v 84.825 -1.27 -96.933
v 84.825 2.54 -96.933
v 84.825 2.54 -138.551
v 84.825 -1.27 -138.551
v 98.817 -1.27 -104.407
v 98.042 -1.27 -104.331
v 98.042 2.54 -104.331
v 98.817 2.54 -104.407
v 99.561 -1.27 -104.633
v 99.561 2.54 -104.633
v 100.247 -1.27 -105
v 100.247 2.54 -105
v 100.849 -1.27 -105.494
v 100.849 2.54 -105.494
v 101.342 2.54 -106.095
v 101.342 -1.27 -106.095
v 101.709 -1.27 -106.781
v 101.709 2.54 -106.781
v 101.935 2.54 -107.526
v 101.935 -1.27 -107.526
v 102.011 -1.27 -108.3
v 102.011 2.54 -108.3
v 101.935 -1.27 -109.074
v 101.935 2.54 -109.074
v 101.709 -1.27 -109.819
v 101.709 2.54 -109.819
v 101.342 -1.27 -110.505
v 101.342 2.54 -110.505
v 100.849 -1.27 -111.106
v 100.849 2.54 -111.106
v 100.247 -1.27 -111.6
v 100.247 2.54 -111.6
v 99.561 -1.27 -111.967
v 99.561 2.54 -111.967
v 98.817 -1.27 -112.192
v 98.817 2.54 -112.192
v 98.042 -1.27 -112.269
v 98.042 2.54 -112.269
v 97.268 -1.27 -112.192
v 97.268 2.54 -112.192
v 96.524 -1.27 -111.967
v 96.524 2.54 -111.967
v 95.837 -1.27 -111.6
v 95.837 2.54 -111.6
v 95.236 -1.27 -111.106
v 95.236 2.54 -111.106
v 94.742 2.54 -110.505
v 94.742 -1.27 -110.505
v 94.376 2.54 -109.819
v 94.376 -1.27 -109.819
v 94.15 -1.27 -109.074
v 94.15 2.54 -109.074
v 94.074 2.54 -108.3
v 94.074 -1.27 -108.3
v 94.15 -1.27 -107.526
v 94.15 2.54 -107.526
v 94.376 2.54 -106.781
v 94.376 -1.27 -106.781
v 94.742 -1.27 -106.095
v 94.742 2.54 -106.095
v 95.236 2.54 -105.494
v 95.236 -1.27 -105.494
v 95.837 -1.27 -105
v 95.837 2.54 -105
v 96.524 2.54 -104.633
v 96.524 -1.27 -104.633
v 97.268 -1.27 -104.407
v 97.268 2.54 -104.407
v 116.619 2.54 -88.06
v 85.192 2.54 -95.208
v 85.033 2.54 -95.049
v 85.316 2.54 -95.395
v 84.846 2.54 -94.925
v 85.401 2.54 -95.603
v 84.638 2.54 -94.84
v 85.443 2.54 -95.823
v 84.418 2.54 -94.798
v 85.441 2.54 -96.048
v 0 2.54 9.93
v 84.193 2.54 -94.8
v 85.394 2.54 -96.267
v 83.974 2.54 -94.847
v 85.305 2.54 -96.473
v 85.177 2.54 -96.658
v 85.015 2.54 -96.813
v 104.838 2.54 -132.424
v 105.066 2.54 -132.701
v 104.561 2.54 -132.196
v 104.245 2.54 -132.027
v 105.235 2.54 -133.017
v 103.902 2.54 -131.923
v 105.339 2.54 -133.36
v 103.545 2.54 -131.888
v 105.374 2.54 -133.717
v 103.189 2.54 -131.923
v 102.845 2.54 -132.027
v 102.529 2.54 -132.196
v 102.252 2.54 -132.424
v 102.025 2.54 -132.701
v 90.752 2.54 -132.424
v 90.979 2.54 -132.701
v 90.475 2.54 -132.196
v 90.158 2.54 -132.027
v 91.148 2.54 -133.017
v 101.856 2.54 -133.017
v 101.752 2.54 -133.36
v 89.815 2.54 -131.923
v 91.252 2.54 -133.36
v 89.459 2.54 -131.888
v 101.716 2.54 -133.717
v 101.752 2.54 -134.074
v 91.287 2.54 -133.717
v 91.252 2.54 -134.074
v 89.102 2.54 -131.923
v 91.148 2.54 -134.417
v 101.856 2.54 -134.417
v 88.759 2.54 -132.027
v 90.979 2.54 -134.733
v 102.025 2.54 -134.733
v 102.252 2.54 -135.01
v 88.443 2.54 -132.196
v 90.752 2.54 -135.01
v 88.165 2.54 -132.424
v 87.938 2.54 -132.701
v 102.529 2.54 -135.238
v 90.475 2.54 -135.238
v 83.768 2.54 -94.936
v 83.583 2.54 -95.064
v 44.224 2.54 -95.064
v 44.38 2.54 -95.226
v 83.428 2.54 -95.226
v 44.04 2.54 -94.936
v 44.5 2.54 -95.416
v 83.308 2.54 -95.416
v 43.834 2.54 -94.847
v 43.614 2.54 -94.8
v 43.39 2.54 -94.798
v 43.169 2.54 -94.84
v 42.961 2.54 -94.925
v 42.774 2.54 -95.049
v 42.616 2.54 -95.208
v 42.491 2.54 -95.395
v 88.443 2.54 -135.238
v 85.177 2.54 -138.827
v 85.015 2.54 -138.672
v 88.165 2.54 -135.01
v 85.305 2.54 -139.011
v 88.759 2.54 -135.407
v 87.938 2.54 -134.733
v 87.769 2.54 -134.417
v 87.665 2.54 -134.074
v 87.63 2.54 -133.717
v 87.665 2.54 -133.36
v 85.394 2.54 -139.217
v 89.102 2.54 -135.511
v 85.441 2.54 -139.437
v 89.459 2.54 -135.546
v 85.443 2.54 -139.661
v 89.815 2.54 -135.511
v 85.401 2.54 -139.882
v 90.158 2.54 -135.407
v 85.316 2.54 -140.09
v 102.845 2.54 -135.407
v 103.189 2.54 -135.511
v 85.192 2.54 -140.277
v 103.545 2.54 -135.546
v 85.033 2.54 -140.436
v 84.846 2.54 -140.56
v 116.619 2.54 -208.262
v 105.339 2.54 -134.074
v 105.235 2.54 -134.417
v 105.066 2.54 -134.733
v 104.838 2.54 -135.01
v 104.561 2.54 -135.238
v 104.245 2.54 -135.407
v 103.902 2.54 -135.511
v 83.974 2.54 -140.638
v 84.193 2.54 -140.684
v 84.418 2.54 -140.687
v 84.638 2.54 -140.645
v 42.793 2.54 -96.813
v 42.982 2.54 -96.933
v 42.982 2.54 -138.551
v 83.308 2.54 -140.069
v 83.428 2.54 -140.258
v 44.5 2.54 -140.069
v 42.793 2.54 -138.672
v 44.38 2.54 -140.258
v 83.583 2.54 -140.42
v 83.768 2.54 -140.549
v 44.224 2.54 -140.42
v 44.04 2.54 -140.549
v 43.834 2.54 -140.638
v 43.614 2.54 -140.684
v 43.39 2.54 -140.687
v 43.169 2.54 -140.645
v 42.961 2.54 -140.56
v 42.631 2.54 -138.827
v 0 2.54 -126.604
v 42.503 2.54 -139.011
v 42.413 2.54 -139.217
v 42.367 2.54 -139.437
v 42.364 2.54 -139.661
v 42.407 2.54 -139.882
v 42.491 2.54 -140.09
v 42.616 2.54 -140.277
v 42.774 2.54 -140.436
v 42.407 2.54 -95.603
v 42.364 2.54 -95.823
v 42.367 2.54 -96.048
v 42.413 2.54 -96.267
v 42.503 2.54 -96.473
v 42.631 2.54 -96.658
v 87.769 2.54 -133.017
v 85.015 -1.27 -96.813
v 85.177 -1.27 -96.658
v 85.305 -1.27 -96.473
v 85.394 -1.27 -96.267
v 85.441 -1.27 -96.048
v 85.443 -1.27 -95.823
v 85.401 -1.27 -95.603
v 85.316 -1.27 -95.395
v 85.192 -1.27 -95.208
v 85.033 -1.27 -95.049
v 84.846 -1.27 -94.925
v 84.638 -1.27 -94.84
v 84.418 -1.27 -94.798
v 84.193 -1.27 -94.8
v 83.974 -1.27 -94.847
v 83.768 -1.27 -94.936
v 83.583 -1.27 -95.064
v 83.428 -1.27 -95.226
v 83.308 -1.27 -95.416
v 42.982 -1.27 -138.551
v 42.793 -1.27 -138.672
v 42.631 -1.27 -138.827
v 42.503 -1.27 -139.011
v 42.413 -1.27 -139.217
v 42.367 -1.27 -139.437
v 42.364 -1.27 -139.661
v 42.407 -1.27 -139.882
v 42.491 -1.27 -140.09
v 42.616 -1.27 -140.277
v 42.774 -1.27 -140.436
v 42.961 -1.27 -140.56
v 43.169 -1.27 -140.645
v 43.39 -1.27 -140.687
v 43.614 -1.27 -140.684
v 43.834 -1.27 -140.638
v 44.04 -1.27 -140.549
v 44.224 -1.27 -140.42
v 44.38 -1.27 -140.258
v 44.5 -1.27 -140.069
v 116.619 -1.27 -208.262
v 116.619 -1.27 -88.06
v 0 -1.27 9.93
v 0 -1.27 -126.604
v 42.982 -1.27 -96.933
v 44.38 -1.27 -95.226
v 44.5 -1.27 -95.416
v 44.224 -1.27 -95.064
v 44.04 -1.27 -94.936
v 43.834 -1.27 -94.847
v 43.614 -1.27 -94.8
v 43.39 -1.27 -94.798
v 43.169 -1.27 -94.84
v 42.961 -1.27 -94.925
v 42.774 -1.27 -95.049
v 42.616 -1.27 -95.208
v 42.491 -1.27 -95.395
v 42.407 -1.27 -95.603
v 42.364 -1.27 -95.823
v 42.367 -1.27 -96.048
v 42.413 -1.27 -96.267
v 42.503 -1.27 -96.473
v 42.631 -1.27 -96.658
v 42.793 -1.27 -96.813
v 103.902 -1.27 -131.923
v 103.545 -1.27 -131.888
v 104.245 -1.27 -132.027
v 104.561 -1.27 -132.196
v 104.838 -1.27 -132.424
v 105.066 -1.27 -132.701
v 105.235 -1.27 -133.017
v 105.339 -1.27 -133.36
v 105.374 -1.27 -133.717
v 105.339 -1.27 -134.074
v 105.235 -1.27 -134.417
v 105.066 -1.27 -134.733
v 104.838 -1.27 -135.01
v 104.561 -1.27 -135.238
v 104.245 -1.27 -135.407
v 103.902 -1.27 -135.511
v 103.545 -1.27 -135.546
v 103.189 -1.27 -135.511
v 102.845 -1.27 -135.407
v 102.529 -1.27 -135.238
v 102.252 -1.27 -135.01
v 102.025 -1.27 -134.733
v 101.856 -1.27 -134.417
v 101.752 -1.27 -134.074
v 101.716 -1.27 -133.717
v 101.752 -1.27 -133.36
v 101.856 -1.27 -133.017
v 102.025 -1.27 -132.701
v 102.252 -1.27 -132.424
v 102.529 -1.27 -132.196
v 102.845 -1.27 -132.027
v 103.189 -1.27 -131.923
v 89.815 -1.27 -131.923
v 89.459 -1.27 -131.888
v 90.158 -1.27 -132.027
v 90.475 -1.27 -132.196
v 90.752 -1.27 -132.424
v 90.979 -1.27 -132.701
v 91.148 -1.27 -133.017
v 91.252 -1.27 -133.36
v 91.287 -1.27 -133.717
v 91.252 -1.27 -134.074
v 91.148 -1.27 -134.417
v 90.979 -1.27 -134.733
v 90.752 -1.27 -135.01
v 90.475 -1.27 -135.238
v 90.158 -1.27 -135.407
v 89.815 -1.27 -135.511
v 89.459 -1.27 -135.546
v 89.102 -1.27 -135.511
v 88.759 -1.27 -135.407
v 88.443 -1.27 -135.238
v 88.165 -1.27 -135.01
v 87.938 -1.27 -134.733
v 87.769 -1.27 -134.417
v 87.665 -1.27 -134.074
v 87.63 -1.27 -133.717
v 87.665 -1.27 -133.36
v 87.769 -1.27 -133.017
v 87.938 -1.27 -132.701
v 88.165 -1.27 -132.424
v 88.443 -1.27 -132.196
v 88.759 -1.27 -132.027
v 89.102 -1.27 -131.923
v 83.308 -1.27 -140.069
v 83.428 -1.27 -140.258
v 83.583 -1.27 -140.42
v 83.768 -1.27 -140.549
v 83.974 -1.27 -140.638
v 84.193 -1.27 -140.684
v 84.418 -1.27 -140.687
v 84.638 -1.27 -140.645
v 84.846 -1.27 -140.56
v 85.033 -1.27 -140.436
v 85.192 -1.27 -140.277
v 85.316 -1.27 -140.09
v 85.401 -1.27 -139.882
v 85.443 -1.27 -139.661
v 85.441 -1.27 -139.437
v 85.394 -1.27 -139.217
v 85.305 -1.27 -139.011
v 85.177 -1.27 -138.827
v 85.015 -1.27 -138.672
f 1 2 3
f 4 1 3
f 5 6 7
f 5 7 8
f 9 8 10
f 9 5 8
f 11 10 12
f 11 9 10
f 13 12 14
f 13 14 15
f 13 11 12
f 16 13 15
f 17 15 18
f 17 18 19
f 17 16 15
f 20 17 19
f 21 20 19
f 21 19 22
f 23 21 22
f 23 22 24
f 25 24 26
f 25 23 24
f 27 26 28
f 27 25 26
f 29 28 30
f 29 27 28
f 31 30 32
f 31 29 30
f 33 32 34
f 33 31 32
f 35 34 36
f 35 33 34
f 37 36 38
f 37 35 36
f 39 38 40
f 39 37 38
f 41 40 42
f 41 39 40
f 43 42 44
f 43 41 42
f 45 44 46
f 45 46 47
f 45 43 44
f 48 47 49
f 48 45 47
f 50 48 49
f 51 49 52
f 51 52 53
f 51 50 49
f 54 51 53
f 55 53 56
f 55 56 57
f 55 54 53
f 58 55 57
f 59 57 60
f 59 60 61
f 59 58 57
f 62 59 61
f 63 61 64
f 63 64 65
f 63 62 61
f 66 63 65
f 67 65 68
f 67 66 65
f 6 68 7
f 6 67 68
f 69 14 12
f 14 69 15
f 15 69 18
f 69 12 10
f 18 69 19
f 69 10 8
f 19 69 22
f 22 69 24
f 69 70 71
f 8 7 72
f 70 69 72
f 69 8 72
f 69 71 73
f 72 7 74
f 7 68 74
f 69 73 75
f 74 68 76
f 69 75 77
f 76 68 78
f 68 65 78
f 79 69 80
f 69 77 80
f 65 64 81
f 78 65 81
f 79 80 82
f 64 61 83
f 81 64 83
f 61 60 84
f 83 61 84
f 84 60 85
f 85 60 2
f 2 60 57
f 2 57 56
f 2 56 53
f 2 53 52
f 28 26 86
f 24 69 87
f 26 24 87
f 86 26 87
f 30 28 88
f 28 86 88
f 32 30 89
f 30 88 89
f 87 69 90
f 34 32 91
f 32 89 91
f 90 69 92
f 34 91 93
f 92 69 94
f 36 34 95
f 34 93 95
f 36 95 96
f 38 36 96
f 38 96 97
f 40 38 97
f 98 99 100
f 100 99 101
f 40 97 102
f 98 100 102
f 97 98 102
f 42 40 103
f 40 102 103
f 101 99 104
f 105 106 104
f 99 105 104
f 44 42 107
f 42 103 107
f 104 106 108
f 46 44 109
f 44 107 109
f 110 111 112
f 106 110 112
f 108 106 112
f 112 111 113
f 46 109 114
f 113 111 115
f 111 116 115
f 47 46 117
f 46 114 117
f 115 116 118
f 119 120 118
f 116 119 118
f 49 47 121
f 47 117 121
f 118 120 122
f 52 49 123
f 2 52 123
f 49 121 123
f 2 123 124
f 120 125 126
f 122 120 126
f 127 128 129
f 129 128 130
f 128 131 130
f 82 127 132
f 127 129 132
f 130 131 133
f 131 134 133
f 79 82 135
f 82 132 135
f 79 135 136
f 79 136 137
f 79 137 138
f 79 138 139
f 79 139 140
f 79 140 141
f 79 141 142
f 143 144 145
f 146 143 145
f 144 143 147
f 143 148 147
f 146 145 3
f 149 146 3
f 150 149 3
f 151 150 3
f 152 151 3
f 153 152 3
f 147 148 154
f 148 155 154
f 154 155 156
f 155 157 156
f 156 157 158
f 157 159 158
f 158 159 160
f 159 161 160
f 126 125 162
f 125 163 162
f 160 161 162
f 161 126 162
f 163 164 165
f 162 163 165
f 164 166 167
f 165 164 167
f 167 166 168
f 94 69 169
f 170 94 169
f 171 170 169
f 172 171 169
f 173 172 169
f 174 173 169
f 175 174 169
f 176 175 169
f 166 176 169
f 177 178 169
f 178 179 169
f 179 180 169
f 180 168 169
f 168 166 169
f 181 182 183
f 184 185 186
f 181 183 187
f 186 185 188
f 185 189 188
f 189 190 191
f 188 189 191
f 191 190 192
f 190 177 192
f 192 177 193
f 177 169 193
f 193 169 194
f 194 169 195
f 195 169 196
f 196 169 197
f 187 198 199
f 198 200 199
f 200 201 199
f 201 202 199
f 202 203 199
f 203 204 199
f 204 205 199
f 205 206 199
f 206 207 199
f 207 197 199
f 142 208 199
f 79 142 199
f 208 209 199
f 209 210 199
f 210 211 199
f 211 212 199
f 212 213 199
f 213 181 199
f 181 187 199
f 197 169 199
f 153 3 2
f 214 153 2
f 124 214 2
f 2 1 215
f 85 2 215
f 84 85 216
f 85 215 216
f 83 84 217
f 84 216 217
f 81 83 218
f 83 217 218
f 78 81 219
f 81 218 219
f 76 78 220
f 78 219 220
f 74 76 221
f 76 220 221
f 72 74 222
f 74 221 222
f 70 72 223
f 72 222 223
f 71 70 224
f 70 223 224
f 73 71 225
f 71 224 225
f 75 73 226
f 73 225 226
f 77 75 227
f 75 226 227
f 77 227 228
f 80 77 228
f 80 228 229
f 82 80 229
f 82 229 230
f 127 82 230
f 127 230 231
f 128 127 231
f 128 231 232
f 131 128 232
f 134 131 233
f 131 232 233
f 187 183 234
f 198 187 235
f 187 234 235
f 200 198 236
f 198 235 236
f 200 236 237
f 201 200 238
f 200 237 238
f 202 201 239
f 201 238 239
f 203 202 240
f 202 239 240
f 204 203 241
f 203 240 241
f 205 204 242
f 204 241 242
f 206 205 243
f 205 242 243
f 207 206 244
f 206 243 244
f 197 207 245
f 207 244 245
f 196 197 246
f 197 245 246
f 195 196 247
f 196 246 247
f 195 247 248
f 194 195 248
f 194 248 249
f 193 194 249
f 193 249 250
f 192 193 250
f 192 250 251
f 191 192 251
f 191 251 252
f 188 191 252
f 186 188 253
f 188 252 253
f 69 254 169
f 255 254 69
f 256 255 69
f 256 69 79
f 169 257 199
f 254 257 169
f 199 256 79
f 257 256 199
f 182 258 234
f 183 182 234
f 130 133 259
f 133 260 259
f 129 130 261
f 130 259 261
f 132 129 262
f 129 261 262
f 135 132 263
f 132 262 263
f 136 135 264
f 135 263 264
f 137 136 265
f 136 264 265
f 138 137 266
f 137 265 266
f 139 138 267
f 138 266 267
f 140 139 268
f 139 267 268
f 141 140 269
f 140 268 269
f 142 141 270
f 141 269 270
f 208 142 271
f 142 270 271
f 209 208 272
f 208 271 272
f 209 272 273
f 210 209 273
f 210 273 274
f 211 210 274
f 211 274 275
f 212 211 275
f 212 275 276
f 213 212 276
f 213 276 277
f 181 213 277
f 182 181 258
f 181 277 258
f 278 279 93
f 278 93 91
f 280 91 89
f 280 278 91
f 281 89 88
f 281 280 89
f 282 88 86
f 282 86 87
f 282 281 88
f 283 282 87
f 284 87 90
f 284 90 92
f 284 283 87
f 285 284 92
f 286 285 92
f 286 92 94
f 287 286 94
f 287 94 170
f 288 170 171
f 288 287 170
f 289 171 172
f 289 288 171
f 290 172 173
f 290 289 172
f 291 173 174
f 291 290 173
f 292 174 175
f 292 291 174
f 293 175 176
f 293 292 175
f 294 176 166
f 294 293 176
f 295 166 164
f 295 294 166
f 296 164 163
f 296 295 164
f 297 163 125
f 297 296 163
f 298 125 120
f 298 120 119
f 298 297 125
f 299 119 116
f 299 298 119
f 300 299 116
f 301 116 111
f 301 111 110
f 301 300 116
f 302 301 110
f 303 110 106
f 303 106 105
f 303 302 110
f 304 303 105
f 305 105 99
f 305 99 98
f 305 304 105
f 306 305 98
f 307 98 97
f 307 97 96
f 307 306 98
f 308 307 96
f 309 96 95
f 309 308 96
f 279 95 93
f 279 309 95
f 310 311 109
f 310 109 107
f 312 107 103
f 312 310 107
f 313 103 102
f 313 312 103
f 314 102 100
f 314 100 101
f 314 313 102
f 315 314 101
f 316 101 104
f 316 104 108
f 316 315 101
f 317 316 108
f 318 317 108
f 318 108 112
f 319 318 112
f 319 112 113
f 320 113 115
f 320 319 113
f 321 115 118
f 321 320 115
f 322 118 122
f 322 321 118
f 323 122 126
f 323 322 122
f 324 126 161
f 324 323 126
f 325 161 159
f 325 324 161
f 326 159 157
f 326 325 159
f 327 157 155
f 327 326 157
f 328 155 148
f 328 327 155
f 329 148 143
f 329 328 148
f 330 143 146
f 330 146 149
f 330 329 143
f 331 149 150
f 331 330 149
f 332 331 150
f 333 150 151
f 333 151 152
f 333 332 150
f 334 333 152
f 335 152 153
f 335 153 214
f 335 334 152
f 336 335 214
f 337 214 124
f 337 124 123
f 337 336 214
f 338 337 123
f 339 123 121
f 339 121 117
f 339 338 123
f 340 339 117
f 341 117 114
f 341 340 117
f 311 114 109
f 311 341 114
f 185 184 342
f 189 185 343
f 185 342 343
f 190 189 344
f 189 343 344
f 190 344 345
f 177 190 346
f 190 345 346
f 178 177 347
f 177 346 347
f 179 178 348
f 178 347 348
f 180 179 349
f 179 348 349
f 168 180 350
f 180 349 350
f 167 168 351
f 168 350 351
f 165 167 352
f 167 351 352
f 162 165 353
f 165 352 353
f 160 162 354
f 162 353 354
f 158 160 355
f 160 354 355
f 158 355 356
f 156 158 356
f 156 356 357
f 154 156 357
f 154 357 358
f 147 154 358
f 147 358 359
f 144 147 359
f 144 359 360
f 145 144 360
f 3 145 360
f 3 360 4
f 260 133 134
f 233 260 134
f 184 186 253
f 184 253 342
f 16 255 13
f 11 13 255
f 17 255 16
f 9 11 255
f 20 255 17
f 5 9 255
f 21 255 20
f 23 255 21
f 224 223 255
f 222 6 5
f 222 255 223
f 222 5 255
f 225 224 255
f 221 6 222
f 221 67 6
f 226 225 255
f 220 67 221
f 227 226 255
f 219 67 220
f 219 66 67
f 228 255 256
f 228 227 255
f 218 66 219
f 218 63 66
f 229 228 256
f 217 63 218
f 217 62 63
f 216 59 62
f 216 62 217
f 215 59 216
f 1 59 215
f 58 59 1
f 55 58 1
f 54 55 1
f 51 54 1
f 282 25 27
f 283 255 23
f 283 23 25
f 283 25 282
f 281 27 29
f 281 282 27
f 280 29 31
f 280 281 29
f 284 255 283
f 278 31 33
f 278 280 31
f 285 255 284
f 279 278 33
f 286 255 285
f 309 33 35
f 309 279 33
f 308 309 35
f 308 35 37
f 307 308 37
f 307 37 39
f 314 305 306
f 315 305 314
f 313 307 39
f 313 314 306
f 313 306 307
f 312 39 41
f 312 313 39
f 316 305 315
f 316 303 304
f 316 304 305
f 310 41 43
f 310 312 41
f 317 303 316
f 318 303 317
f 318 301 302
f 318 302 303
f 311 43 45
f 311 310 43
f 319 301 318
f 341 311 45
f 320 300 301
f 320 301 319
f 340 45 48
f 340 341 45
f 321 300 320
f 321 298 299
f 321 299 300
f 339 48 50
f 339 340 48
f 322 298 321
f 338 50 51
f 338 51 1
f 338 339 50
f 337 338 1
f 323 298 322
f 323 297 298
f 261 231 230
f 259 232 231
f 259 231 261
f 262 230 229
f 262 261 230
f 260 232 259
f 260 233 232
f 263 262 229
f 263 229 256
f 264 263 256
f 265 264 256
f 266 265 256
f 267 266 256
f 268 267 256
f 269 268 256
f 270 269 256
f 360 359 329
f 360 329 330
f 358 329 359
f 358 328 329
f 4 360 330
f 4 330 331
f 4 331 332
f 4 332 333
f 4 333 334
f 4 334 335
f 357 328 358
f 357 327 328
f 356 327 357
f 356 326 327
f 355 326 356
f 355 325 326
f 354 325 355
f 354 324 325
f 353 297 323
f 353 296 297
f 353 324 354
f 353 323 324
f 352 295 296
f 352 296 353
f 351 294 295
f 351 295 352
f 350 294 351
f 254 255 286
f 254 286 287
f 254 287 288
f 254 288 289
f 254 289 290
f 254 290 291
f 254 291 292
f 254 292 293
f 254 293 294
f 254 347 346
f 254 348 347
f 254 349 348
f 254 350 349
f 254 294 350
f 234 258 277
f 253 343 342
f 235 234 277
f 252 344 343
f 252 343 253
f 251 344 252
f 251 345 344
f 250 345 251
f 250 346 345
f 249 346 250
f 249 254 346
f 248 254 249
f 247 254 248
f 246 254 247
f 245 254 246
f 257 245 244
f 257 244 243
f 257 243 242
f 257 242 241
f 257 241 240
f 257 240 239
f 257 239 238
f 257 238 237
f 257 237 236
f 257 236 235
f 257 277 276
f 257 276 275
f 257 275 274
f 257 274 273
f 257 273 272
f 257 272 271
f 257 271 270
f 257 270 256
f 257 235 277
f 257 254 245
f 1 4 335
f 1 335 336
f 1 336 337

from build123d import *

# Parameters (mm, degrees)
BOSS_EXTRUDE1_DEPTH         = 2.54
BOSS_EXTRUDE1_DEPTH_BACK    = 1.27
SKETCH1_R                   = 3.96875
SKETCH1_R_2                 = 1.8288
SKETCH1_W                   = 41.843046883
SKETCH1_H                   = 42.037
SKETCH2_W                   = 41.843046883
SKETCH2_H                   = 1.3462
SKETCH2_H_2                 = 1.27
CUT_EXTRUDE1_DEPTH          = 239.72059927
F_43_0_089_DIAMETER_HOLE1_D = 2.2606


with BuildPart() as part:
    # Sketch1 → Boss-Extrude1 (new, two sides: drawn at the far end of the back side and taken through both)
    with BuildSketch(Plane(origin=(0, 0, 0), x_dir=(1, 0, 0), z_dir=(0, 1, 0)).offset(-BOSS_EXTRUDE1_DEPTH_BACK)):
        Polygon((0, -9.930453132), (0, 126.604027306), (116.61929014, 208.261733362), (116.61929014, 88.059530464), align=None)
        with Locations(Location((98.042383887, 108.299920281, 0), (0, 0, 270))):
            Circle(SKETCH1_R, mode=Mode.SUBTRACT)
        with Locations(Location((89.458607167, 133.716920501, 0), (0, 0, 270))):
            Circle(SKETCH1_R_2, mode=Mode.SUBTRACT)
        with Locations(Location((103.545290714, 133.716920501, 0), (0, 0, 270))):
            Circle(SKETCH1_R_2, mode=Mode.SUBTRACT)
        with Locations((63.903769784, 117.780411398)):
            Rectangle(SKETCH1_W, SKETCH1_H, mode=Mode.SUBTRACT)
    extrude(amount=BOSS_EXTRUDE1_DEPTH + BOSS_EXTRUDE1_DEPTH_BACK)

    # Sketch2 → Cut-Extrude1 (cut, through all)
    with BuildSketch(Plane(origin=(0, 2.54, 0), x_dir=(1, 0, 0), z_dir=(0, 1, 0))):
        with Locations((63.903769784, 96.088811398)):
            Rectangle(SKETCH2_W, SKETCH2_H)
        with Locations((63.903769784, 139.433911398)):
            Rectangle(SKETCH2_W, SKETCH2_H_2)
    extrude(amount=-CUT_EXTRUDE1_DEPTH, mode=Mode.SUBTRACT)

    # #43 (0.089) Diameter Hole1 (through all)
    with Locations(Plane(origin=(0, 2.54, 0), x_dir=(1, 0, 0), z_dir=(0, 1, 0))):
        with Locations((84.317293225, 95.923711398), (84.317293225, 139.560911398), (43.490246342, 95.923711398), (43.490246342, 139.560911398)):
            Hole(F_43_0_089_DIAMETER_HOLE1_D / 2)


solid = part.part
